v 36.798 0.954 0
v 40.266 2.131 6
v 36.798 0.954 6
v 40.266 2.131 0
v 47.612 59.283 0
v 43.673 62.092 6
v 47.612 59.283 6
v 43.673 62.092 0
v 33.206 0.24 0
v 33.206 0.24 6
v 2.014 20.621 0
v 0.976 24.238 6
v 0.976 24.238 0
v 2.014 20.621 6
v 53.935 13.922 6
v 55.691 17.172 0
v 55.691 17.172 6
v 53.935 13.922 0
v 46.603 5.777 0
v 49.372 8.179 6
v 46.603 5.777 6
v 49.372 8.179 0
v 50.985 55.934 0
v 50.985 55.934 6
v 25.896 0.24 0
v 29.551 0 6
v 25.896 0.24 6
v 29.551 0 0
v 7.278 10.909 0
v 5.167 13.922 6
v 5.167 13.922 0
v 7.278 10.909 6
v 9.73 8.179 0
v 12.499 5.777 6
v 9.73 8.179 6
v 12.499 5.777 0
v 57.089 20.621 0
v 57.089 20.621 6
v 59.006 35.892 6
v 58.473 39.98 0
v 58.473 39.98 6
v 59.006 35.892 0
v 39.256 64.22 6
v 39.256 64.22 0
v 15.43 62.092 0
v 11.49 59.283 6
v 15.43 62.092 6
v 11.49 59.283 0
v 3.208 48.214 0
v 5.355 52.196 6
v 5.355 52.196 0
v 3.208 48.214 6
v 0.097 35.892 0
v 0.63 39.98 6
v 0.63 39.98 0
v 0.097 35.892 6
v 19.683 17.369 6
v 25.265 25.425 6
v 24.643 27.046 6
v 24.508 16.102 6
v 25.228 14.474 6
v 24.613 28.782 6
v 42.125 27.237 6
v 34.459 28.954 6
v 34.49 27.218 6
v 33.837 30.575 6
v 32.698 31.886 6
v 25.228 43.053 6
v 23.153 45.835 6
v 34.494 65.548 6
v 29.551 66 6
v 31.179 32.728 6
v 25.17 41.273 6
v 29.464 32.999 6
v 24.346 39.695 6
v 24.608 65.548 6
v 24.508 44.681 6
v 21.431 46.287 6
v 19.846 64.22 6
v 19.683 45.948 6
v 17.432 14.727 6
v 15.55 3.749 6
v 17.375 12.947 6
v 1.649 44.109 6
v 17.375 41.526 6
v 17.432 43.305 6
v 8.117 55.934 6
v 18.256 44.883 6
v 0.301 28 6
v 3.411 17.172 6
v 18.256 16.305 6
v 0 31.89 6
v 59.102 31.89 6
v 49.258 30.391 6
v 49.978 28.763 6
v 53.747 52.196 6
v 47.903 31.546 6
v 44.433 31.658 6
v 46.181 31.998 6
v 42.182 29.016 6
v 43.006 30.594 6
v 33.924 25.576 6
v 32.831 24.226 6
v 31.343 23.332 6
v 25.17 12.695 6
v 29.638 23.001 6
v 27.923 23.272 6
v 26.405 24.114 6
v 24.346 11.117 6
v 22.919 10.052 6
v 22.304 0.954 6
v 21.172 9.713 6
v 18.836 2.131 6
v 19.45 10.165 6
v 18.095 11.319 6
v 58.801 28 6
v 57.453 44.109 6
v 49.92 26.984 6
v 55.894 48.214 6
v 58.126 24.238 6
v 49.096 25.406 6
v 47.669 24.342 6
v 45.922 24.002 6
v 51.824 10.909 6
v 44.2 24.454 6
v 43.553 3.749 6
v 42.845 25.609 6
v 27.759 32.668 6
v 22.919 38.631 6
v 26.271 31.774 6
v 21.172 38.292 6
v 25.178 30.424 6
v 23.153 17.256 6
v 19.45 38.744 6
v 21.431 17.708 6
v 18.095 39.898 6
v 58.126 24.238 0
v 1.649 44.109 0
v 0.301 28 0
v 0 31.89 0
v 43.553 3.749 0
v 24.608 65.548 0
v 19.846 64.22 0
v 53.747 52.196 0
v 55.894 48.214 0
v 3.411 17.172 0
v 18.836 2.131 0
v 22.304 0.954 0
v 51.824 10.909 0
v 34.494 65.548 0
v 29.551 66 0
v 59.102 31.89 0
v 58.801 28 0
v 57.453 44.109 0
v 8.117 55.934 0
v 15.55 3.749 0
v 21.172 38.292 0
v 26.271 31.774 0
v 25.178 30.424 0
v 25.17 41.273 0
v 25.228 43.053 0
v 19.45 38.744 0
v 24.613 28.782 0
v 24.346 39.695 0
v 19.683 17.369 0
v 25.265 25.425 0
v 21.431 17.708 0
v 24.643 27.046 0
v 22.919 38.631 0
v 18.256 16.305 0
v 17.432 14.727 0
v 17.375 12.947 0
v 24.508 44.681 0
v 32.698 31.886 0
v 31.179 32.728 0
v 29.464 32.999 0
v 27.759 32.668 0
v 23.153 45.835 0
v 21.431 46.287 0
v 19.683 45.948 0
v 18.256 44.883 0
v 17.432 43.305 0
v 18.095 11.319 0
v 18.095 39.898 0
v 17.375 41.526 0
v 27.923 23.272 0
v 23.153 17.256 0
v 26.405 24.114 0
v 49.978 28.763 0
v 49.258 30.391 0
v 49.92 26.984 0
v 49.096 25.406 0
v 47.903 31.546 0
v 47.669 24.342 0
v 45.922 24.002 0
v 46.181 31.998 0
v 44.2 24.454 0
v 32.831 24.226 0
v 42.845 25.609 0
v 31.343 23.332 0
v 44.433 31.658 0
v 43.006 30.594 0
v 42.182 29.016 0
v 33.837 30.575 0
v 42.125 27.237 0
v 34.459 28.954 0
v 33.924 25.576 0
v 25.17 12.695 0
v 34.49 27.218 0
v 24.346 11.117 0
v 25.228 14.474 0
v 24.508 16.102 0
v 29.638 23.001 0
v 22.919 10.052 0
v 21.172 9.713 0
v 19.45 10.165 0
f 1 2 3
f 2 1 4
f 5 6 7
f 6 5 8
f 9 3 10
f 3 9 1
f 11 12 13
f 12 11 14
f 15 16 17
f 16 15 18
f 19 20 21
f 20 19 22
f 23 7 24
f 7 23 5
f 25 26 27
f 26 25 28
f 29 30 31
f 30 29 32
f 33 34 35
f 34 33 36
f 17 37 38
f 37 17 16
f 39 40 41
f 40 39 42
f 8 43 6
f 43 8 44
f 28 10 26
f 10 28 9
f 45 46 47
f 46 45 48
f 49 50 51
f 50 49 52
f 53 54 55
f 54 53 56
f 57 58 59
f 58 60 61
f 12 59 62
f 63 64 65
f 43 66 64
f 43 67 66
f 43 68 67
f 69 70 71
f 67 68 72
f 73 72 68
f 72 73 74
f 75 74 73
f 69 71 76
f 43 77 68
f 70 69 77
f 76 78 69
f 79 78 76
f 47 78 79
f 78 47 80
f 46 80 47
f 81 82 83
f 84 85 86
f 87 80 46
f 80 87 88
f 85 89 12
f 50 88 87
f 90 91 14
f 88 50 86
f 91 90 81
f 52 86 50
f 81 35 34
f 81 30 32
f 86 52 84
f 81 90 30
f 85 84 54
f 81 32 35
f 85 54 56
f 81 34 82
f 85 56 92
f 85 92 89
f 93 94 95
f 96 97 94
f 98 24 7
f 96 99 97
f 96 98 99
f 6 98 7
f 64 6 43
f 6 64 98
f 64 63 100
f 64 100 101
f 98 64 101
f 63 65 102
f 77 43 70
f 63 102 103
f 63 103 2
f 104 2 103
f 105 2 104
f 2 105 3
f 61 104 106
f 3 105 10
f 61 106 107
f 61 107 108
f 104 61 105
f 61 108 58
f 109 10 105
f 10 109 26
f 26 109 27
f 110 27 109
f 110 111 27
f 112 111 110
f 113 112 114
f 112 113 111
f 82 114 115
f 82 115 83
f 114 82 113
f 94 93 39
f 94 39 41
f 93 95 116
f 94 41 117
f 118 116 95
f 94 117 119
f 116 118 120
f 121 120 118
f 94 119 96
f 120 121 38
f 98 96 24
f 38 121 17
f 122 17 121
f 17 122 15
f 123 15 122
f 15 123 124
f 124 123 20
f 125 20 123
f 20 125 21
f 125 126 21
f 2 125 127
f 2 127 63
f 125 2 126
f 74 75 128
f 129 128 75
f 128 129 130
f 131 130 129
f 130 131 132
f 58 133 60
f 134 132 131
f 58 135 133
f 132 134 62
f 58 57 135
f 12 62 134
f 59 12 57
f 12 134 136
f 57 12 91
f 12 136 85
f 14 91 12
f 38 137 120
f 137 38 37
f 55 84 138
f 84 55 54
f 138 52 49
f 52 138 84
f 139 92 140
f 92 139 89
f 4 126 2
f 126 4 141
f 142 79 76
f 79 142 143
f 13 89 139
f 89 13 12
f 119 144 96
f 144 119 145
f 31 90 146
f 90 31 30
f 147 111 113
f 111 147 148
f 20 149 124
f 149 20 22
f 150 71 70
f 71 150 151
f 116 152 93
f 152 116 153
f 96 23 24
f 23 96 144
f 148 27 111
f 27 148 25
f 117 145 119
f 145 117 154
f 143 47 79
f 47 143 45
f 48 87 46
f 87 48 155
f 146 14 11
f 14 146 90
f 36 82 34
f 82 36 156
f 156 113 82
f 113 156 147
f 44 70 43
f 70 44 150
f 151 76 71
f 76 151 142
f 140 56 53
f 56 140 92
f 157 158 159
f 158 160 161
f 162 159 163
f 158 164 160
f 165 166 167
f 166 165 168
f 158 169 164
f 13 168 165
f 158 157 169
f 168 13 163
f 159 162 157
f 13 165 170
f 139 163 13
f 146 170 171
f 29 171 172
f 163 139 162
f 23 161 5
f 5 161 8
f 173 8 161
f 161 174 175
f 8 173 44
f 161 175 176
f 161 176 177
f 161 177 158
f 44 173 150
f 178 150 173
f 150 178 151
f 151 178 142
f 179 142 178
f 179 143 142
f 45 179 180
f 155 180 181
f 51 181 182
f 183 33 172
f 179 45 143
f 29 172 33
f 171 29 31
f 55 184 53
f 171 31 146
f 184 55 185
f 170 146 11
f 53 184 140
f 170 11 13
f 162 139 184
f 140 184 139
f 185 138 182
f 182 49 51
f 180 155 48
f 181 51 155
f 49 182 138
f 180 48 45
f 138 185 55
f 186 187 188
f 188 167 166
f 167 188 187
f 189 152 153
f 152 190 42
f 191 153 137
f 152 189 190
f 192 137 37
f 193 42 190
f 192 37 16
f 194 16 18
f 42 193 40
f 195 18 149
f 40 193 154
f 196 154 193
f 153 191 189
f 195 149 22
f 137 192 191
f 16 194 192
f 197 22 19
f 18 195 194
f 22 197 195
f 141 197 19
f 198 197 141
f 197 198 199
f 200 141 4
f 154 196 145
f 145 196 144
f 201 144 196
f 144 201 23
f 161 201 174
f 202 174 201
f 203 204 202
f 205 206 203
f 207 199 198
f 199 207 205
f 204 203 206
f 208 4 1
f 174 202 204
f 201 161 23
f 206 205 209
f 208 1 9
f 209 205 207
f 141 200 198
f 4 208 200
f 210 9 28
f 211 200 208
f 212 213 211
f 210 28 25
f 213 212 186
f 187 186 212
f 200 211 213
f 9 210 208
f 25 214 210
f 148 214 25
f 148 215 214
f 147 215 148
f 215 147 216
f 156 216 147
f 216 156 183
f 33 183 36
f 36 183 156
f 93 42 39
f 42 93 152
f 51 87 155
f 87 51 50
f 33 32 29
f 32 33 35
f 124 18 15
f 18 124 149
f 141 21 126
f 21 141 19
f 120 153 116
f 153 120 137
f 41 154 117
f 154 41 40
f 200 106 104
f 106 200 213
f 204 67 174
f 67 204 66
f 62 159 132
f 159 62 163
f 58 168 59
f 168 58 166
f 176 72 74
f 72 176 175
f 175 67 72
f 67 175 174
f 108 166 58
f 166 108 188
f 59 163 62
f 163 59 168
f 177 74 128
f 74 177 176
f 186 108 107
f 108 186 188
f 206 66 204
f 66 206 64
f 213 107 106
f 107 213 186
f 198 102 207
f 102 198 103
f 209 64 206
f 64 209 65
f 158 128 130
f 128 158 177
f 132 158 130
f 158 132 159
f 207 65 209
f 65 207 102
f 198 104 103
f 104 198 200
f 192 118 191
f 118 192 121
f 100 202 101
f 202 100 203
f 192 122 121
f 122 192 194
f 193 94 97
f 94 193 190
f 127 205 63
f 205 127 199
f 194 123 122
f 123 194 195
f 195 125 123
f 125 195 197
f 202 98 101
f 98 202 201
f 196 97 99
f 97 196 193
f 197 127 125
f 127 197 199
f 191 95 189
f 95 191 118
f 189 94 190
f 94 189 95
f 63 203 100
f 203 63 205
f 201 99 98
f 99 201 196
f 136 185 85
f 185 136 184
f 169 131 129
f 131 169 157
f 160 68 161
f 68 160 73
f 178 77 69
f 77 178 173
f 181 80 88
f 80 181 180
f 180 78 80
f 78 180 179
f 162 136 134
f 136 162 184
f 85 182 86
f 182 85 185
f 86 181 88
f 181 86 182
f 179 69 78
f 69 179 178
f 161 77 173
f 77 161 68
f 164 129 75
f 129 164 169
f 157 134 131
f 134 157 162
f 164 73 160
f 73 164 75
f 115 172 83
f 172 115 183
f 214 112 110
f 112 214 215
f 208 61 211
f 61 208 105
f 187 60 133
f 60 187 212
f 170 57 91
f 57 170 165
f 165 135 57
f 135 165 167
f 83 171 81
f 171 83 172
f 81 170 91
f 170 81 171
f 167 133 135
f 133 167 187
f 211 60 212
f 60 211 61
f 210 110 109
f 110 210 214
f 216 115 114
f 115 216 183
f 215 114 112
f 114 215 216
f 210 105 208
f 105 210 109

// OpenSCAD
$fn = 32;

// ----------------------------------------------------------------------
// Cam plate: single_lobe cam, base R28
// ----------------------------------------------------------------------

// --- parameters (mm) ---
base_r = 28;              // base circle radius
lobe_h = 10;              // cam lobe rise
bore_r = 5;               // shaft bore radius
plate_t = 6;              // plate thickness, Z (extrusion height)
ring_r = 16.5;            // lightening ring radius
bolt_r = 4;               // lightening hole radius

profile = [[58.801, 28], [59.102, 31.89], [59.006, 35.892], [58.473, 39.98], [57.453, 44.109], [55.894, 48.214], [53.747, 52.196], [50.985, 55.934], [47.612, 59.283], [43.673, 62.092], [39.256, 64.22], [34.494, 65.548], [29.551, 66], [24.608, 65.548], [19.846, 64.22], [15.43, 62.092], [11.49, 59.283], [8.117, 55.934], [5.355, 52.196], [3.208, 48.214], [1.649, 44.109], [0.63, 39.98], [0.097, 35.892], [0, 31.89], [0.301, 28], [0.976, 24.238], [2.014, 20.621], [3.411, 17.172], [5.167, 13.922], [7.278, 10.909], [9.73, 8.179], [12.499, 5.777], [15.55, 3.749], [18.836, 2.131], [22.304, 0.954], [25.896, 0.24], [29.551, 0], [33.206, 0.24], [36.798, 0.954], [40.266, 2.131], [43.553, 3.749], [46.603, 5.777], [49.372, 8.179], [51.824, 10.909], [53.935, 13.922], [55.691, 17.172], [57.089, 20.621], [58.126, 24.238]];  // primary outline, 48 points, counter clockwise
void_1 = [[34.459, 28.954], [33.837, 30.575], [32.698, 31.886], [31.179, 32.728], [29.464, 32.999], [27.759, 32.668], [26.271, 31.774], [25.178, 30.424], [24.613, 28.782], [24.643, 27.046], [25.265, 25.425], [26.405, 24.114], [27.923, 23.272], [29.638, 23.001], [31.343, 23.332], [32.831, 24.226], [33.924, 25.576], [34.49, 27.218]];  // shaft bore, 18 points
void_2 = [[49.978, 28.763], [49.258, 30.391], [47.903, 31.546], [46.181, 31.998], [44.433, 31.658], [43.006, 30.594], [42.182, 29.016], [42.125, 27.237], [42.845, 25.609], [44.2, 24.454], [45.922, 24.002], [47.669, 24.342], [49.096, 25.406], [49.92, 26.984]];  // lightening hole 1, 14 points
void_3 = [[25.228, 43.053], [24.508, 44.681], [23.153, 45.835], [21.431, 46.287], [19.683, 45.948], [18.256, 44.883], [17.432, 43.305], [17.375, 41.526], [18.095, 39.898], [19.45, 38.744], [21.172, 38.292], [22.919, 38.631], [24.346, 39.695], [25.17, 41.273]];  // lightening hole 2, 14 points
void_4 = [[25.228, 14.474], [24.508, 16.102], [23.153, 17.256], [21.431, 17.708], [19.683, 17.369], [18.256, 16.305], [17.432, 14.727], [17.375, 12.947], [18.095, 11.319], [19.45, 10.165], [21.172, 9.713], [22.919, 10.052], [24.346, 11.117], [25.17, 12.695]];  // lightening hole 3, 14 points

// --- the one profile operation ---
difference() {
  linear_extrude(height = plate_t) polygon(points = profile);
  translate([0, 0, -1])
    linear_extrude(height = plate_t + 2) polygon(points = void_1);
  translate([0, 0, -1])
    linear_extrude(height = plate_t + 2) polygon(points = void_2);
  translate([0, 0, -1])
    linear_extrude(height = plate_t + 2) polygon(points = void_3);
  translate([0, 0, -1])
    linear_extrude(height = plate_t + 2) polygon(points = void_4);
}
